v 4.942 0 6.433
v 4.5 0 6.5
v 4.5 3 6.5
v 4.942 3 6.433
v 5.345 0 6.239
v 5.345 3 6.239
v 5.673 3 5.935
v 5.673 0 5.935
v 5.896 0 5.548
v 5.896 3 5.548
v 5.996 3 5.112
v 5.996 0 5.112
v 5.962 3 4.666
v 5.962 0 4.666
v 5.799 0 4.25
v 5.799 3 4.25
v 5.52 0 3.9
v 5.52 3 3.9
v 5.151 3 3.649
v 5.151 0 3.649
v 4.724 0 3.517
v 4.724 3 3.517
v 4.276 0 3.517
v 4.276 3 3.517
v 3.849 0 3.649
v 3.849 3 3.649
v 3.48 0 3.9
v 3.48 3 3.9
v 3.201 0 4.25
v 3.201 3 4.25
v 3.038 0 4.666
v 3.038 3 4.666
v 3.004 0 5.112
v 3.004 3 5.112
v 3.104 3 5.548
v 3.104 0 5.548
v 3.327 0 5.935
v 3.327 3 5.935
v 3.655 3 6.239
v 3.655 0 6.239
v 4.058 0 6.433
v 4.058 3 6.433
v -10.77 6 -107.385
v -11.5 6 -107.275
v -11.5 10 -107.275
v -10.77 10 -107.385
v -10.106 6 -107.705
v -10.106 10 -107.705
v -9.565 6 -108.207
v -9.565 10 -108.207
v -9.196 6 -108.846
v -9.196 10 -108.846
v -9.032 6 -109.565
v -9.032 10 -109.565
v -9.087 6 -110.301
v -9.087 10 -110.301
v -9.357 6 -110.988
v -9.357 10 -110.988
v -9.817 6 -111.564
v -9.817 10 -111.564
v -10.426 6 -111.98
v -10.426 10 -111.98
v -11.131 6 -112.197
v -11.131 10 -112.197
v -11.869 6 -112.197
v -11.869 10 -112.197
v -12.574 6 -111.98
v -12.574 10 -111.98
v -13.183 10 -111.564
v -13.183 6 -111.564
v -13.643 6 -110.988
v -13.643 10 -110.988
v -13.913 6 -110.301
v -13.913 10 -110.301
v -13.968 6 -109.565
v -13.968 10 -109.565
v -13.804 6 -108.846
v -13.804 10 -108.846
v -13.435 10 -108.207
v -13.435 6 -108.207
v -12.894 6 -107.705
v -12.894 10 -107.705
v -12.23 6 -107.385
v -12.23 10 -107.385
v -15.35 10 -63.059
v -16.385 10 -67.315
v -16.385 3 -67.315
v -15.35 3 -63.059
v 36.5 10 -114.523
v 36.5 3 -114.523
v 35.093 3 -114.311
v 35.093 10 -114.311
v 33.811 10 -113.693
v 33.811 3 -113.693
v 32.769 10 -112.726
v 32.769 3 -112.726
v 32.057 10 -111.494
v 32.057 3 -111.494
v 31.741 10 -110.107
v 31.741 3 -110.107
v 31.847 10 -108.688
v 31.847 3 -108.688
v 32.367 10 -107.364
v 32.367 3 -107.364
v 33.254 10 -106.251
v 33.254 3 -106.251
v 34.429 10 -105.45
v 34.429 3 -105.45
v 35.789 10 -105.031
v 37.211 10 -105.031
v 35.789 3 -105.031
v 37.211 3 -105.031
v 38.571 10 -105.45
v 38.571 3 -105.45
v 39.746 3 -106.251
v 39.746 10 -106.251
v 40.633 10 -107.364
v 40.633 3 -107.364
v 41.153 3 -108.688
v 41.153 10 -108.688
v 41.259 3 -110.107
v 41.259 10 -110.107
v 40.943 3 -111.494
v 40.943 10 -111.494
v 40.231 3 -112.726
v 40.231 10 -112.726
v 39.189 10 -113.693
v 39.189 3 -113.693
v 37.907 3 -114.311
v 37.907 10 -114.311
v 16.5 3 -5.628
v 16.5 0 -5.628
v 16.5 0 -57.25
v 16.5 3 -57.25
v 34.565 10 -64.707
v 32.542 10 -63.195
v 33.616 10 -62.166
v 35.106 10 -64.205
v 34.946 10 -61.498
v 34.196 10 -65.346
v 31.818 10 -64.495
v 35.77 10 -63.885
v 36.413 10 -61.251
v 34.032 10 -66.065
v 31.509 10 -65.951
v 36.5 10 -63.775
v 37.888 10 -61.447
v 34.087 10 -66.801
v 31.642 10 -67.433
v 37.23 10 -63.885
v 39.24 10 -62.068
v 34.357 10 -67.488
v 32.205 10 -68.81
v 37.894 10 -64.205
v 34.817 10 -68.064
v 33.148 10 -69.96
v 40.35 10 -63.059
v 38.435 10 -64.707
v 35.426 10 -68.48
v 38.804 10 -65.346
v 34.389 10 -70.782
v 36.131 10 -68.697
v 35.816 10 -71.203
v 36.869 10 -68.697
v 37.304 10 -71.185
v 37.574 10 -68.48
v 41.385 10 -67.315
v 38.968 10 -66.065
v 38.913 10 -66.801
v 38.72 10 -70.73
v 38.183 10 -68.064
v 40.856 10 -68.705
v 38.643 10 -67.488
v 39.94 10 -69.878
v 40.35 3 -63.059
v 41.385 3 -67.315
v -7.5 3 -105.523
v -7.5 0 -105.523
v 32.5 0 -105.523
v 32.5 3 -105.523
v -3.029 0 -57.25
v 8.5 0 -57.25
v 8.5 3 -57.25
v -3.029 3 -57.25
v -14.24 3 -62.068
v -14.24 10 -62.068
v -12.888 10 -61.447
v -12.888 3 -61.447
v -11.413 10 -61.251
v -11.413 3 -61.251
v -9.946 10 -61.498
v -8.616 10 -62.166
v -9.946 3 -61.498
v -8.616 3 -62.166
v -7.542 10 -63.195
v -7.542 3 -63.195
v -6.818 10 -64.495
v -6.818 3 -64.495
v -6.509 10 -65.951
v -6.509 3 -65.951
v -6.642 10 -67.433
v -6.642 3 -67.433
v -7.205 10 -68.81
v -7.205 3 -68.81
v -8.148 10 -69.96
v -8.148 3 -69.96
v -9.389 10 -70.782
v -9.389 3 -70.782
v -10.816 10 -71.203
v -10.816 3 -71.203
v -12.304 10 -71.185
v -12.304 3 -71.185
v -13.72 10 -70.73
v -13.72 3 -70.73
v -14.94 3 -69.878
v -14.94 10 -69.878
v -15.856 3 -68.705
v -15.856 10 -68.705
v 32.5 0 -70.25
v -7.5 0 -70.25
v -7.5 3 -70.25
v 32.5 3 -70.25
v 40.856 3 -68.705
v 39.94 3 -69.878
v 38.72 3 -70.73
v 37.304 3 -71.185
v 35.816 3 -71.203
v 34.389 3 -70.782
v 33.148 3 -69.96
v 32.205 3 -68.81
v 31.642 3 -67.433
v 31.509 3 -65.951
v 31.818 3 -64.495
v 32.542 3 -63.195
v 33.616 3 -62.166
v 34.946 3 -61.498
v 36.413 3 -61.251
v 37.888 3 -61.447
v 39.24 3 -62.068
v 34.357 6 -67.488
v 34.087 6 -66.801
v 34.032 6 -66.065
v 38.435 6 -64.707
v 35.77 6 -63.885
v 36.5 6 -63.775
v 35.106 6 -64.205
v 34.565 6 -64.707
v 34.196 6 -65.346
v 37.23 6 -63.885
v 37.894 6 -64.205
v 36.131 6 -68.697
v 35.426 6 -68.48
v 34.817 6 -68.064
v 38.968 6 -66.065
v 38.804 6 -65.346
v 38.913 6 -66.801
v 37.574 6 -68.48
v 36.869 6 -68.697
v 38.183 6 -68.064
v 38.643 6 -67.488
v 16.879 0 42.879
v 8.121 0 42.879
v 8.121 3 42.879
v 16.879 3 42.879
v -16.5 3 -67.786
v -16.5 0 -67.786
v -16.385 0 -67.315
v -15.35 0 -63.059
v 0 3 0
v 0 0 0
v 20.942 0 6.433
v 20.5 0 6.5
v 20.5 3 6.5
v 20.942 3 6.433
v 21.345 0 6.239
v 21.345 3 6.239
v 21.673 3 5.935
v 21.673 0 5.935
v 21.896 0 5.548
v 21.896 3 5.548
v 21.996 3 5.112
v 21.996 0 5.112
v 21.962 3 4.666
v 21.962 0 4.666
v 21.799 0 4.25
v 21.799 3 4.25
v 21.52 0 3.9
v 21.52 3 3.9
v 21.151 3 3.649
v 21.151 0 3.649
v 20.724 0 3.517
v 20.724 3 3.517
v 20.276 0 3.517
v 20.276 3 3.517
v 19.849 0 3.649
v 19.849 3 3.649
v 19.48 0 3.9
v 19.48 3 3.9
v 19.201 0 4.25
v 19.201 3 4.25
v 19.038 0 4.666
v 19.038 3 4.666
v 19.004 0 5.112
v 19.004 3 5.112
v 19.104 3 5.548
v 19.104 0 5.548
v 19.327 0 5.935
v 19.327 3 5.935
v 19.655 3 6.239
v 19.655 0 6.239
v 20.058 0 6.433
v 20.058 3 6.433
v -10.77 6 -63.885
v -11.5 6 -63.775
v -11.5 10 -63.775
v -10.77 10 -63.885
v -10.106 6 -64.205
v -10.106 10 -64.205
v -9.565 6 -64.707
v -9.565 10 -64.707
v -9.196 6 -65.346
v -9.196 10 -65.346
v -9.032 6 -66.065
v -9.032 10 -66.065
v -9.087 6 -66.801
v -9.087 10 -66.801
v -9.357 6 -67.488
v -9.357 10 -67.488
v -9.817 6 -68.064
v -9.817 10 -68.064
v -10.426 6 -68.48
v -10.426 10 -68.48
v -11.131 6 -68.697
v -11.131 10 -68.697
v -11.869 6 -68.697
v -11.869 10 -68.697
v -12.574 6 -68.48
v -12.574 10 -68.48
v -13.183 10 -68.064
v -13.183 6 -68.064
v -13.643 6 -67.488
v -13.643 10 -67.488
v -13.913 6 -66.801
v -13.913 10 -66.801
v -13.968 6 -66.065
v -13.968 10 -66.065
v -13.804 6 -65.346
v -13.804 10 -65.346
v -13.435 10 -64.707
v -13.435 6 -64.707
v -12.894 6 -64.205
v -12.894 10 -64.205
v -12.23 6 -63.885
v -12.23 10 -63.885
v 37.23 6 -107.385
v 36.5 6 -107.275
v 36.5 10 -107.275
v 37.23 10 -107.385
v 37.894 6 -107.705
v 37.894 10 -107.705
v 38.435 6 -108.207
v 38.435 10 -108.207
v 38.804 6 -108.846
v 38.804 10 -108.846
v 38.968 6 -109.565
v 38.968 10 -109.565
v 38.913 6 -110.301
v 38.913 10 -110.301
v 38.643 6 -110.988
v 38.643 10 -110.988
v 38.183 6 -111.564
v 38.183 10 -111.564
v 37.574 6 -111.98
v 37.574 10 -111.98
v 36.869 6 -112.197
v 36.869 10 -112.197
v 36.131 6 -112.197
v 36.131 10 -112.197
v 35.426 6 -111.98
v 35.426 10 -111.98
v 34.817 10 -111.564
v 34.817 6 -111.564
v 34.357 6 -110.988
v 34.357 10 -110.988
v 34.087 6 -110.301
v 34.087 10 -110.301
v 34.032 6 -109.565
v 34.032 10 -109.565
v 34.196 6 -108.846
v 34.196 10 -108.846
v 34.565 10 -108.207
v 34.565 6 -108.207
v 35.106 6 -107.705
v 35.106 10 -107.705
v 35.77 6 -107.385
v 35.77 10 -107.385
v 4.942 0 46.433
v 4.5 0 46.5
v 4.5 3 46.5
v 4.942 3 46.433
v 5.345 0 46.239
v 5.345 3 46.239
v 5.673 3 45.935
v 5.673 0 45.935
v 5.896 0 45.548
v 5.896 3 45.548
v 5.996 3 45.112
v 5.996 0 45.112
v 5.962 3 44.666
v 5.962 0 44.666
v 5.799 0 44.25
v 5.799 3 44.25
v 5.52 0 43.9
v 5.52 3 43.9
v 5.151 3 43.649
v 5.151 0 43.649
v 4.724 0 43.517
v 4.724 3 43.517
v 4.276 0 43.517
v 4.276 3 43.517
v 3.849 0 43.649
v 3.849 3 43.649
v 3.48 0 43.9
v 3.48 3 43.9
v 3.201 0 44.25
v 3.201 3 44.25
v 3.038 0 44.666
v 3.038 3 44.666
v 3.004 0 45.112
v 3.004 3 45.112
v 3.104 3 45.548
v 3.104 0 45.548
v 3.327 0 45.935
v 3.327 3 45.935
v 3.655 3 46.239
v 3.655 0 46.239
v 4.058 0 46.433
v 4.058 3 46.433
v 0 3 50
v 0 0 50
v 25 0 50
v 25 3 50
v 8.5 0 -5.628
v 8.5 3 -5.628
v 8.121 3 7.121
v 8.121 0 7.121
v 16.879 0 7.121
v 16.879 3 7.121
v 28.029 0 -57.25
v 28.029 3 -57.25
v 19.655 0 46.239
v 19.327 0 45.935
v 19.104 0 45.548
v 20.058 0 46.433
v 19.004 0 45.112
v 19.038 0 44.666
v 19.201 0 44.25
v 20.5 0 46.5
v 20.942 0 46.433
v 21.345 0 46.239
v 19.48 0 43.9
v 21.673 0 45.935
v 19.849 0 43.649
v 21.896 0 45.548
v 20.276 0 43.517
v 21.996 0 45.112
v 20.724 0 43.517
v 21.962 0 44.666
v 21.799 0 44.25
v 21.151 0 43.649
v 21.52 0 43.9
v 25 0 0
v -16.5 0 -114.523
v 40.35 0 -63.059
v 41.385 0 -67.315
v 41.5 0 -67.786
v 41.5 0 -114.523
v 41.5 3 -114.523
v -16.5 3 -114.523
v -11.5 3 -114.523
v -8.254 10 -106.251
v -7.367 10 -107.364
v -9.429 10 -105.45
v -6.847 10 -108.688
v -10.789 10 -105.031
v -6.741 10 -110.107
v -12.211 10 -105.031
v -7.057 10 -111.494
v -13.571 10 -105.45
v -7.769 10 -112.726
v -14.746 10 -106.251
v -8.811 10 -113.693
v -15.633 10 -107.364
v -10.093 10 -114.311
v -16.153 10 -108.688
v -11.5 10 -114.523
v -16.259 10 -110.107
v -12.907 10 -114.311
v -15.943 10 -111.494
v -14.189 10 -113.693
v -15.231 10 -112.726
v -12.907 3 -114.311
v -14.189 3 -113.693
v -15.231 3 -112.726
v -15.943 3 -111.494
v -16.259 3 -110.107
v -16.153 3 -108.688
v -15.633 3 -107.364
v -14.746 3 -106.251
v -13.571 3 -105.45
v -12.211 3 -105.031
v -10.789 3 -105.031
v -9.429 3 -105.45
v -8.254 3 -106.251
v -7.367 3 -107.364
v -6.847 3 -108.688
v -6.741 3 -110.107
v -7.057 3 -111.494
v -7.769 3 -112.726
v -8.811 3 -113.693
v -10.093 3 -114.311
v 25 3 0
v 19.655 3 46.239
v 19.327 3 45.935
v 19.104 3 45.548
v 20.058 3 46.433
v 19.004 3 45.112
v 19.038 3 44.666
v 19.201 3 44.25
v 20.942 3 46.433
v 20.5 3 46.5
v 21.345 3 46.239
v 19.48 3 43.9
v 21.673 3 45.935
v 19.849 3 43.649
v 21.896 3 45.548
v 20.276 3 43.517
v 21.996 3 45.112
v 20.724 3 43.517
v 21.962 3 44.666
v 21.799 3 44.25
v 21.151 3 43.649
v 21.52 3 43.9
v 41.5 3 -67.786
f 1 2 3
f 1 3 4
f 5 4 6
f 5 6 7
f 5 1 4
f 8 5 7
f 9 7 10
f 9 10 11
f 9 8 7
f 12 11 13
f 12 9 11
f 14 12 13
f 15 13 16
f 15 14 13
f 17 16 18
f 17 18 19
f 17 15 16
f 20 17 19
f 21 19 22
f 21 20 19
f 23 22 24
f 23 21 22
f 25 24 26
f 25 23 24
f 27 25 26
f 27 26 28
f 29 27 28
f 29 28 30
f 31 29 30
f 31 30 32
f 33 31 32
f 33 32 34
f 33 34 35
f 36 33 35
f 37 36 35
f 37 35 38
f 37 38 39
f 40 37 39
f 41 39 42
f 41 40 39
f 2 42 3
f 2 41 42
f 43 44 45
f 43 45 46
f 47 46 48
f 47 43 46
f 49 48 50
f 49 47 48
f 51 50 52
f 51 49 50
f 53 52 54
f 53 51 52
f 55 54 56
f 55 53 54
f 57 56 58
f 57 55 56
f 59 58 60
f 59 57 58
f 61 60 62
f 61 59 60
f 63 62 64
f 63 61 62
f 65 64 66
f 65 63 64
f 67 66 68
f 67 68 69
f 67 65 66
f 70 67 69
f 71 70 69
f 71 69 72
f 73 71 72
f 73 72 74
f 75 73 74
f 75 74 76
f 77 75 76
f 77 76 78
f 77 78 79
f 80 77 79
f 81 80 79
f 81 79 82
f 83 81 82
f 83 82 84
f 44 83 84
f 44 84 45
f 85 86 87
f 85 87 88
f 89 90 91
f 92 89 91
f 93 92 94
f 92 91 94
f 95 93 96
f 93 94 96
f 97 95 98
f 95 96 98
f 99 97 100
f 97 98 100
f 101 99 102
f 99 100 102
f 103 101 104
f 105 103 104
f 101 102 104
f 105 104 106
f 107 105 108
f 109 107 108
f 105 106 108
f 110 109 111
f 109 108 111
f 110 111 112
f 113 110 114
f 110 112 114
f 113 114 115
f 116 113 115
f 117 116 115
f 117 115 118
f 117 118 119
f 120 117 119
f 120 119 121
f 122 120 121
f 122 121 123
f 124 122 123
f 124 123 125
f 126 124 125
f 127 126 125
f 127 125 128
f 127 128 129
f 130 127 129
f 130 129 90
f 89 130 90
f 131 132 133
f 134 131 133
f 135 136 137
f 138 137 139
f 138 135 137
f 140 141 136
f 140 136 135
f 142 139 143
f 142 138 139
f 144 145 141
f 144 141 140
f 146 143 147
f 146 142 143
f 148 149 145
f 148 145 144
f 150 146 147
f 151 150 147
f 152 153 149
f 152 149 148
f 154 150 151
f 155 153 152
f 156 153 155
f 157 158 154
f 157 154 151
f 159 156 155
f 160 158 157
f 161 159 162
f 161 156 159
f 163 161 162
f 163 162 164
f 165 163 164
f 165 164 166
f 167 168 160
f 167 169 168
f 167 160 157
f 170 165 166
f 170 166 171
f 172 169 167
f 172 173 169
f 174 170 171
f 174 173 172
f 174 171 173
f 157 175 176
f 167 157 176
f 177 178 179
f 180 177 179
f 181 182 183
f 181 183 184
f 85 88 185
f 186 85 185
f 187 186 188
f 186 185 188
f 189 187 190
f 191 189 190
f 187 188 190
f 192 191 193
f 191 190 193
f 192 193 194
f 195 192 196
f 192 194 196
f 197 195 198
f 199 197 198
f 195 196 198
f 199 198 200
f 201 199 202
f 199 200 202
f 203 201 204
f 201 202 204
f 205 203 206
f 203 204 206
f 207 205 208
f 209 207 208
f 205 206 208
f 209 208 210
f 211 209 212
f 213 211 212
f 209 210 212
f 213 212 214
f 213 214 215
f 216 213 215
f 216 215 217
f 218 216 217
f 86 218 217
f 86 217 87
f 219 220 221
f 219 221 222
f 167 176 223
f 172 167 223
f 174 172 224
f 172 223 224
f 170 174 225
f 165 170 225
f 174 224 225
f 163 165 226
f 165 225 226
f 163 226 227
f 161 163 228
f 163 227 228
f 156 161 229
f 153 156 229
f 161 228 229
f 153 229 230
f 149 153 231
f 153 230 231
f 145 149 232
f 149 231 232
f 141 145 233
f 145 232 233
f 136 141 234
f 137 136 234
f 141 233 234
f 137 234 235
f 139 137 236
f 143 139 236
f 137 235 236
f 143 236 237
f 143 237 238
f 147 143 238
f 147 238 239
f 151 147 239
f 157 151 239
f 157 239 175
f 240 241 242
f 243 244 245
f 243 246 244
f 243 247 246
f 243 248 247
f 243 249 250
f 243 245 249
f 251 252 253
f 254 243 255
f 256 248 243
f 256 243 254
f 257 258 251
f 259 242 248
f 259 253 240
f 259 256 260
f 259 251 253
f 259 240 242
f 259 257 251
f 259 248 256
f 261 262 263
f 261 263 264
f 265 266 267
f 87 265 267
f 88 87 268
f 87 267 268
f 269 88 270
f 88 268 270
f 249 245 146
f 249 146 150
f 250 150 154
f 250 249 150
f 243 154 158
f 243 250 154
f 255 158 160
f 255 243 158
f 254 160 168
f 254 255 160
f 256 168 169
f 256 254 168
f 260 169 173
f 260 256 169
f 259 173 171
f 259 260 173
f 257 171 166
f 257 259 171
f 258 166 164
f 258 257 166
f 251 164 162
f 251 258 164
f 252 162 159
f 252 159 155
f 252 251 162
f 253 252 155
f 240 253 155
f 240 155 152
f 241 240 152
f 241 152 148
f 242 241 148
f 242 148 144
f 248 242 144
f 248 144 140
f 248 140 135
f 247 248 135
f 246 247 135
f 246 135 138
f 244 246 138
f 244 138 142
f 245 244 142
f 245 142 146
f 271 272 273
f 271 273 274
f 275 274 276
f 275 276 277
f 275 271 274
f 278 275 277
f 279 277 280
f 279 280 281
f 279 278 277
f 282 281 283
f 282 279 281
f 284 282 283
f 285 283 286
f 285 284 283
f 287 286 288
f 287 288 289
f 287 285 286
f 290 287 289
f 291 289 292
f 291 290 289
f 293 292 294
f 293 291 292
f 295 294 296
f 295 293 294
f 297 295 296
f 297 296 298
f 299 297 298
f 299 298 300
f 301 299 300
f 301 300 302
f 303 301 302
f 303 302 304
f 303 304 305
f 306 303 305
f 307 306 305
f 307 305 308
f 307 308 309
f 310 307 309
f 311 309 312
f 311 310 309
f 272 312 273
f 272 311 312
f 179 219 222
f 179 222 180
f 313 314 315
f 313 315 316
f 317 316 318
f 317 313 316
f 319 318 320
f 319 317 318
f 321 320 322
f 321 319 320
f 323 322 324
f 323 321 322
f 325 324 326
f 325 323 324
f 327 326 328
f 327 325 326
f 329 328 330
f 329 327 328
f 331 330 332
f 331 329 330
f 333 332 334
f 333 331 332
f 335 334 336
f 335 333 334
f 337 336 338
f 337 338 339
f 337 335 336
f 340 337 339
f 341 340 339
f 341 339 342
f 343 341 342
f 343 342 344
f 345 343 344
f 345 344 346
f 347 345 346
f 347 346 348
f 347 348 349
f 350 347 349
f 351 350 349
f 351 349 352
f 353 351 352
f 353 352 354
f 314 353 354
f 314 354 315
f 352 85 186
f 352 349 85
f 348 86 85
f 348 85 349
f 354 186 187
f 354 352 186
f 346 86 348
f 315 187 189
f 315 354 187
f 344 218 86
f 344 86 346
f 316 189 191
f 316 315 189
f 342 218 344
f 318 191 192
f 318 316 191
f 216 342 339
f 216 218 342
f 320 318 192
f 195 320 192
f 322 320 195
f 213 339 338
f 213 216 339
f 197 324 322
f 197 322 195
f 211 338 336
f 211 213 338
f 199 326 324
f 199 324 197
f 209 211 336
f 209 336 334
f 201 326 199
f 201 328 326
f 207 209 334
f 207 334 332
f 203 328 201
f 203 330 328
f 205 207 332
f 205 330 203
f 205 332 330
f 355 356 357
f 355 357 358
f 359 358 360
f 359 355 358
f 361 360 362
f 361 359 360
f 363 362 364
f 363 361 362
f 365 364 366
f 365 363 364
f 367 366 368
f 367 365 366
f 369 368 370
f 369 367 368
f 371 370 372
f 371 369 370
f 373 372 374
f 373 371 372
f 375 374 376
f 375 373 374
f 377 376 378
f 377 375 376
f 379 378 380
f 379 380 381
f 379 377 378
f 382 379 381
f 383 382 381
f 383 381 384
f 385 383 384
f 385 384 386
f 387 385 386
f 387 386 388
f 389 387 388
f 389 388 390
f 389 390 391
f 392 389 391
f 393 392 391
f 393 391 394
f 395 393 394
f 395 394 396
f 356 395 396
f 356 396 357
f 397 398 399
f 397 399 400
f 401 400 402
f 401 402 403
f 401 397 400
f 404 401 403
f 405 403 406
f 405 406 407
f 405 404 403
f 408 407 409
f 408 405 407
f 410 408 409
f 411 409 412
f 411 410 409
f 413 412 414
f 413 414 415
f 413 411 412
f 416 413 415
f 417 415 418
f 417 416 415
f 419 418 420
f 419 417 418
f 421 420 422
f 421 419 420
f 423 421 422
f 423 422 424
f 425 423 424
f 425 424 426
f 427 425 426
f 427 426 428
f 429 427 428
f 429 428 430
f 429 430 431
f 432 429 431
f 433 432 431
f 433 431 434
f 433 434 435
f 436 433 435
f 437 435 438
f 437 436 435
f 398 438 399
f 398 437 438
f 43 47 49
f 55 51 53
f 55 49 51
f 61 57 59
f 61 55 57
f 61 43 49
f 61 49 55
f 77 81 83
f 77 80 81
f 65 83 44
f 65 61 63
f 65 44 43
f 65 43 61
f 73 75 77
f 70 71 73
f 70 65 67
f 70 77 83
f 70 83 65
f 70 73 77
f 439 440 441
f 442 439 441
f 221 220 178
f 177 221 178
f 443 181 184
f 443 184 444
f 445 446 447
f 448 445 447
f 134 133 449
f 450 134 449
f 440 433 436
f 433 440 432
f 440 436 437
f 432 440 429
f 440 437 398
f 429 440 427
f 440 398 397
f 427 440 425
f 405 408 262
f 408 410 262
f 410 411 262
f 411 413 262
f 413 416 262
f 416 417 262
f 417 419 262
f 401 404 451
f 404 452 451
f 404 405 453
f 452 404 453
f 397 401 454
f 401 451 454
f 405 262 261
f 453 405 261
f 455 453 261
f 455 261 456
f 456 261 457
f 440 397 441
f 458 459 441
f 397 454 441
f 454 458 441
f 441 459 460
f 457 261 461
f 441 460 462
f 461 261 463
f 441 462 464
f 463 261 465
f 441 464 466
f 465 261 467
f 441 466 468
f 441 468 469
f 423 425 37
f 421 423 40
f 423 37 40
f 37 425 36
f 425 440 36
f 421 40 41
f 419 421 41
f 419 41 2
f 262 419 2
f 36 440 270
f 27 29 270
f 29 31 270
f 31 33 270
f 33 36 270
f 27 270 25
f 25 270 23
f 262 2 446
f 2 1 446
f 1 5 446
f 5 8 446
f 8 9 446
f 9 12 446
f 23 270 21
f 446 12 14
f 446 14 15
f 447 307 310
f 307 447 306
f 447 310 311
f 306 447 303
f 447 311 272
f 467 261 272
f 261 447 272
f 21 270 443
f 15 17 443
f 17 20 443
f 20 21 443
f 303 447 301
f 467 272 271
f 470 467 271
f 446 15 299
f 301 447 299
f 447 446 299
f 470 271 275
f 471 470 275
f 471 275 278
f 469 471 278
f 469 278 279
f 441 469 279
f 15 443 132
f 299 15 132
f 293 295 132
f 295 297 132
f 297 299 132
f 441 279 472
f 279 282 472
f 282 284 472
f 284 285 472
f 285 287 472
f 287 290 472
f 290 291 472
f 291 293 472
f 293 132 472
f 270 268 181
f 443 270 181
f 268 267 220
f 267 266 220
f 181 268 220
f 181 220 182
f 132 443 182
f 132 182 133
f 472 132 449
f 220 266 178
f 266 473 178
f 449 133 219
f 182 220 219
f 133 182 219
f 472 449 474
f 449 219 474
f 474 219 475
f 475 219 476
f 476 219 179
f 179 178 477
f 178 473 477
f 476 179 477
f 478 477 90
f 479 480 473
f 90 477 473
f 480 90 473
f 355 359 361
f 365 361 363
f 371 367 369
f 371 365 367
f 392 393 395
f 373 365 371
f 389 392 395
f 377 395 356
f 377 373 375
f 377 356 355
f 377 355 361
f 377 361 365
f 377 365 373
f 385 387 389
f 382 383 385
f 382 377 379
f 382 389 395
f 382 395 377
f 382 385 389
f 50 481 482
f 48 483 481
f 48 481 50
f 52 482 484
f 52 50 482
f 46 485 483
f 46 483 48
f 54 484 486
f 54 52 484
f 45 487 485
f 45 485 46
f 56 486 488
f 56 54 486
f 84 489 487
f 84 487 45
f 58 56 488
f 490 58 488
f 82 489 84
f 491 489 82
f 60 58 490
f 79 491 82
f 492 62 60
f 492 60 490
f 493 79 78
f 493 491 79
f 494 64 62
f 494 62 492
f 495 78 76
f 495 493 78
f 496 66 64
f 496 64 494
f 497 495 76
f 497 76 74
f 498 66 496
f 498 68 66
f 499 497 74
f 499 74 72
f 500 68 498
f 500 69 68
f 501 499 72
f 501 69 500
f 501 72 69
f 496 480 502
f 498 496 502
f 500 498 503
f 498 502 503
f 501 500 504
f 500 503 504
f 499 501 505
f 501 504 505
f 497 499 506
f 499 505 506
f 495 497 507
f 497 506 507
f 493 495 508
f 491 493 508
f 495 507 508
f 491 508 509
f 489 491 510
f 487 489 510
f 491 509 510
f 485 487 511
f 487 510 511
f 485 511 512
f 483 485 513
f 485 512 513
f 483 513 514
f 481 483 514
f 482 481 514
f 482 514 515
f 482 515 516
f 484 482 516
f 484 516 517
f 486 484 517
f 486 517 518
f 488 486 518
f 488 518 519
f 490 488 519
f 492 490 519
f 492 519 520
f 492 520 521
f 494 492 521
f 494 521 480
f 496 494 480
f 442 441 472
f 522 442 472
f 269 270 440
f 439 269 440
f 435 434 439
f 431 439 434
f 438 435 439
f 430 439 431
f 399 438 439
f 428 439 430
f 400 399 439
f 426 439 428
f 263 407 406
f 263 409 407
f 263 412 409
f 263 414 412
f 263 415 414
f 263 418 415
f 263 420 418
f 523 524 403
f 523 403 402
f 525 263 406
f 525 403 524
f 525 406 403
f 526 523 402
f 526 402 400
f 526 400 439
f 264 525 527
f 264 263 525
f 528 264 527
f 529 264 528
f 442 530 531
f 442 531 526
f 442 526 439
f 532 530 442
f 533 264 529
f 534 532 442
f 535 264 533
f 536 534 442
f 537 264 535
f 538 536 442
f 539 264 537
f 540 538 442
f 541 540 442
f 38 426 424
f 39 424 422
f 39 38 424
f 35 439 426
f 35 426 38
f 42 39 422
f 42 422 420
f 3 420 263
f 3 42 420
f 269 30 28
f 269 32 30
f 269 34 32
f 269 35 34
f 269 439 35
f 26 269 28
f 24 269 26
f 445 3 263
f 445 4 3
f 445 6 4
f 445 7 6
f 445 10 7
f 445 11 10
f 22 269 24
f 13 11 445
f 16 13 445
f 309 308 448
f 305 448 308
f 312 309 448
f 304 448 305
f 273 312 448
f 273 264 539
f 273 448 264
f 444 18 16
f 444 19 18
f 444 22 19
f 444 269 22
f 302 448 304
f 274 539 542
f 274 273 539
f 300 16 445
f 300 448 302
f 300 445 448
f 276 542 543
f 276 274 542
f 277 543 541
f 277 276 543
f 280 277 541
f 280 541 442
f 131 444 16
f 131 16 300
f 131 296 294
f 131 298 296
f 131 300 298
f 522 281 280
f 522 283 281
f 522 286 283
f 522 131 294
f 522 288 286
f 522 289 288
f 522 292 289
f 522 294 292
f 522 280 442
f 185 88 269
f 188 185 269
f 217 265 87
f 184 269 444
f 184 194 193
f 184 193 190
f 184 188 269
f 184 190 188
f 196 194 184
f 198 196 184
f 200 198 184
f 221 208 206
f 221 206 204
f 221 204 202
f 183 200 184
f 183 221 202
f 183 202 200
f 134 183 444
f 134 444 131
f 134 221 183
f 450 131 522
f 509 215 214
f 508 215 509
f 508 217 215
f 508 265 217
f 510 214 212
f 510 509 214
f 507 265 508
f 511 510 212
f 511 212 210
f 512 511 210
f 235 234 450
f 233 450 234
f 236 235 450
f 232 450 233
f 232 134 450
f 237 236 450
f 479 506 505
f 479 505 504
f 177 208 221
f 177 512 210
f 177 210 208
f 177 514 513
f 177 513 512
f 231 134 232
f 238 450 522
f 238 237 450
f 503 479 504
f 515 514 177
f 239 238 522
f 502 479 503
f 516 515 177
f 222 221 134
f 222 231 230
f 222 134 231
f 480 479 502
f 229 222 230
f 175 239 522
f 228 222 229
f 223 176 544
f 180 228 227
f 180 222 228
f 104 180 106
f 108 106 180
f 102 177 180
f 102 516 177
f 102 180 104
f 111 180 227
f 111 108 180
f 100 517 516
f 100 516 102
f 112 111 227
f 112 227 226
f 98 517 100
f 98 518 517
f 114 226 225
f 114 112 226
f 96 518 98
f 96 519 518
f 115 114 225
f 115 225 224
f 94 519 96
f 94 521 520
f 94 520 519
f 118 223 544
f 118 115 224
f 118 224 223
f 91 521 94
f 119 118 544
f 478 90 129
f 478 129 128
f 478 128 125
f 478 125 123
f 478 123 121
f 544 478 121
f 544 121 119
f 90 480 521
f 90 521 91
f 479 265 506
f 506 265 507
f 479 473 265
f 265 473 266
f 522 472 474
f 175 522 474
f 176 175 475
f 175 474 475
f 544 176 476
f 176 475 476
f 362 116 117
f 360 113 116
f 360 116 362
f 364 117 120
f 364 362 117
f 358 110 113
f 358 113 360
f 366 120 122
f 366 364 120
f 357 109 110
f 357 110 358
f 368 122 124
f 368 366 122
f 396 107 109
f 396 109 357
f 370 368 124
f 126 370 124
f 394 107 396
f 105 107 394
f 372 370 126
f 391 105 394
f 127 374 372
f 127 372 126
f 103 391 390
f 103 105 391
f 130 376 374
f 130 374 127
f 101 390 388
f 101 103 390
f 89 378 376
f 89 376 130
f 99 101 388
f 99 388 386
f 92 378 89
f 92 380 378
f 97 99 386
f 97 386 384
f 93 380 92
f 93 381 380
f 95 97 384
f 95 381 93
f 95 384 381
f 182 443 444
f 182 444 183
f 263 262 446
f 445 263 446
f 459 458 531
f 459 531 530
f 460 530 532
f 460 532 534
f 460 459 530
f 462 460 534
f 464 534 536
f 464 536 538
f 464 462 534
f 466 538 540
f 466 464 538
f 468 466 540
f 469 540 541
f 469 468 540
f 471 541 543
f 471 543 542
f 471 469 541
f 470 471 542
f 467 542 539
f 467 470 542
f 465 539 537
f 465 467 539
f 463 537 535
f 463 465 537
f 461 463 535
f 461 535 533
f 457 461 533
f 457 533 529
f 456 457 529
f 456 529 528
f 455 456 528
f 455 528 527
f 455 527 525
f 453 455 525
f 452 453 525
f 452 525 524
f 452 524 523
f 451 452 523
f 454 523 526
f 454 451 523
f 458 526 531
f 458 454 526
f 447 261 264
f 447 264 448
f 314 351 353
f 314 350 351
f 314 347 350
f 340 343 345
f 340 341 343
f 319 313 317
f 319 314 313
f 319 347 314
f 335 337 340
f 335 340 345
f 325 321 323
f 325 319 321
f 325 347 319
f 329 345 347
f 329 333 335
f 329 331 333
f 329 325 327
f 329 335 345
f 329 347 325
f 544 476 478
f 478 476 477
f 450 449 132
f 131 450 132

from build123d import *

# Parameters (mm, degrees)
SKETCH2_W           = 8.757359312
SKETCH2_H           = 35.757359312
SKETCH2_R           = 1.5
BOSS_EXTRUDE1_DEPTH = 3
SKETCH2_4_R         = 4.77269061
BOSS_EXTRUDE2_DEPTH = 6
SKETCH2_5_R         = 2.475
SKETCH2_5_R_2       = 4.77269061
BOSS_EXTRUDE3_DEPTH = 10


with BuildPart() as part:
    # Sketch2 → Boss-Extrude1 (new body)
    with BuildSketch(Plane(origin=(0, 0, 0), x_dir=(1, 0, 0), z_dir=(0, 1, 0))):
        Polygon((25, -50), (25, 0), (41.5, 67.785623806), (41.5, 114.52269061), (-16.5, 114.52269061), (-16.5, 67.785623806), (0, 0), (0, -50), align=None)
        with Locations((12.5, -25)):
            Rectangle(SKETCH2_W, SKETCH2_H, mode=Mode.SUBTRACT)
        with Locations((4.5, -45)):
            Circle(SKETCH2_R, mode=Mode.SUBTRACT)
        with Locations((20.5, -45)):
            Circle(SKETCH2_R, mode=Mode.SUBTRACT)
        with Locations((20.5, -5)):
            Circle(SKETCH2_R, mode=Mode.SUBTRACT)
        with Locations((4.5, -5)):
            Circle(SKETCH2_R, mode=Mode.SUBTRACT)
        Polygon((8.5, 57.25), (8.5, 5.628094968), (-3.028914458, 57.25), align=None, mode=Mode.SUBTRACT)
        Polygon((16.5, 57.25), (28.028914458, 57.25), (16.5, 5.628094968), align=None, mode=Mode.SUBTRACT)
        Polygon((-7.5, 105.52269061), (32.5, 105.52269061), (32.5, 88), (32.5, 70.25), (-7.5, 70.25), (-7.5, 88), align=None, mode=Mode.SUBTRACT)
    extrude(amount=BOSS_EXTRUDE1_DEPTH)

    # Sketch2<4> → Boss-Extrude2 (add)
    with BuildSketch(Plane(origin=(0, 0, 0), x_dir=(1, 0, 0), z_dir=(0, 1, 0))):
        with BuildLine():
            Line((-16.385347151, 67.314604722), (-15.349520723, 63.059202262))
            ThreePointArc((-15.349520723, 63.059202262), (-6.641853057, 67.432543142), (-16.385347151, 67.314604722))
        make_face()
        with BuildLine():
            Line((40.349520723, 63.059202262), (41.385347151, 67.314604722))
            ThreePointArc((41.385347151, 67.314604722), (31.641853057, 67.432543142), (40.349520723, 63.059202262))
        make_face()
        with Locations((-11.5, 109.75)):
            Circle(SKETCH2_4_R)
        with Locations((36.5, 109.75)):
            Circle(SKETCH2_4_R)
    extrude(amount=BOSS_EXTRUDE2_DEPTH)

    # Sketch2<5> → Boss-Extrude3 (add)
    # profile 1 of 4: a face of its own
    with BuildSketch(Plane(origin=(0, 0, 0), x_dir=(1, 0, 0), z_dir=(0, 1, 0))):
        with BuildLine():
            Line((-16.385347151, 67.314604722), (-15.349520723, 63.059202262))
            ThreePointArc((-15.349520723, 63.059202262), (-6.641853057, 67.432543142), (-16.385347151, 67.314604722))
        make_face()
        with Locations((-11.5, 66.25)):
            Circle(SKETCH2_5_R, mode=Mode.SUBTRACT)
    # profile 2 of 4: a face of its own
    with BuildSketch(Plane(origin=(0, 0, 0), x_dir=(1, 0, 0), z_dir=(0, 1, 0))):
        with BuildLine():
            ThreePointArc((41.385347151, 67.314604722), (31.641853057, 67.432543142), (40.349520723, 63.059202262))
            Line((40.349520723, 63.059202262), (41.385347151, 67.314604722))
        make_face()
        with Locations((36.5, 66.25)):
            Circle(SKETCH2_5_R, mode=Mode.SUBTRACT)
    # profile 3 of 4: a face of its own
    with BuildSketch(Plane(origin=(0, 0, 0), x_dir=(1, 0, 0), z_dir=(0, 1, 0))):
        with Locations((-11.5, 109.75)):
            Circle(SKETCH2_5_R_2)
        with Locations((-11.5, 109.75)):
            Circle(SKETCH2_5_R, mode=Mode.SUBTRACT)
    # profile 4 of 4: a face of its own
    with BuildSketch(Plane(origin=(0, 0, 0), x_dir=(1, 0, 0), z_dir=(0, 1, 0))):
        with Locations((36.5, 109.75)):
            Circle(SKETCH2_5_R_2)
        with Locations((36.5, 109.75)):
            Circle(SKETCH2_5_R, mode=Mode.SUBTRACT)
    extrude(amount=BOSS_EXTRUDE3_DEPTH)


solid = part.part
